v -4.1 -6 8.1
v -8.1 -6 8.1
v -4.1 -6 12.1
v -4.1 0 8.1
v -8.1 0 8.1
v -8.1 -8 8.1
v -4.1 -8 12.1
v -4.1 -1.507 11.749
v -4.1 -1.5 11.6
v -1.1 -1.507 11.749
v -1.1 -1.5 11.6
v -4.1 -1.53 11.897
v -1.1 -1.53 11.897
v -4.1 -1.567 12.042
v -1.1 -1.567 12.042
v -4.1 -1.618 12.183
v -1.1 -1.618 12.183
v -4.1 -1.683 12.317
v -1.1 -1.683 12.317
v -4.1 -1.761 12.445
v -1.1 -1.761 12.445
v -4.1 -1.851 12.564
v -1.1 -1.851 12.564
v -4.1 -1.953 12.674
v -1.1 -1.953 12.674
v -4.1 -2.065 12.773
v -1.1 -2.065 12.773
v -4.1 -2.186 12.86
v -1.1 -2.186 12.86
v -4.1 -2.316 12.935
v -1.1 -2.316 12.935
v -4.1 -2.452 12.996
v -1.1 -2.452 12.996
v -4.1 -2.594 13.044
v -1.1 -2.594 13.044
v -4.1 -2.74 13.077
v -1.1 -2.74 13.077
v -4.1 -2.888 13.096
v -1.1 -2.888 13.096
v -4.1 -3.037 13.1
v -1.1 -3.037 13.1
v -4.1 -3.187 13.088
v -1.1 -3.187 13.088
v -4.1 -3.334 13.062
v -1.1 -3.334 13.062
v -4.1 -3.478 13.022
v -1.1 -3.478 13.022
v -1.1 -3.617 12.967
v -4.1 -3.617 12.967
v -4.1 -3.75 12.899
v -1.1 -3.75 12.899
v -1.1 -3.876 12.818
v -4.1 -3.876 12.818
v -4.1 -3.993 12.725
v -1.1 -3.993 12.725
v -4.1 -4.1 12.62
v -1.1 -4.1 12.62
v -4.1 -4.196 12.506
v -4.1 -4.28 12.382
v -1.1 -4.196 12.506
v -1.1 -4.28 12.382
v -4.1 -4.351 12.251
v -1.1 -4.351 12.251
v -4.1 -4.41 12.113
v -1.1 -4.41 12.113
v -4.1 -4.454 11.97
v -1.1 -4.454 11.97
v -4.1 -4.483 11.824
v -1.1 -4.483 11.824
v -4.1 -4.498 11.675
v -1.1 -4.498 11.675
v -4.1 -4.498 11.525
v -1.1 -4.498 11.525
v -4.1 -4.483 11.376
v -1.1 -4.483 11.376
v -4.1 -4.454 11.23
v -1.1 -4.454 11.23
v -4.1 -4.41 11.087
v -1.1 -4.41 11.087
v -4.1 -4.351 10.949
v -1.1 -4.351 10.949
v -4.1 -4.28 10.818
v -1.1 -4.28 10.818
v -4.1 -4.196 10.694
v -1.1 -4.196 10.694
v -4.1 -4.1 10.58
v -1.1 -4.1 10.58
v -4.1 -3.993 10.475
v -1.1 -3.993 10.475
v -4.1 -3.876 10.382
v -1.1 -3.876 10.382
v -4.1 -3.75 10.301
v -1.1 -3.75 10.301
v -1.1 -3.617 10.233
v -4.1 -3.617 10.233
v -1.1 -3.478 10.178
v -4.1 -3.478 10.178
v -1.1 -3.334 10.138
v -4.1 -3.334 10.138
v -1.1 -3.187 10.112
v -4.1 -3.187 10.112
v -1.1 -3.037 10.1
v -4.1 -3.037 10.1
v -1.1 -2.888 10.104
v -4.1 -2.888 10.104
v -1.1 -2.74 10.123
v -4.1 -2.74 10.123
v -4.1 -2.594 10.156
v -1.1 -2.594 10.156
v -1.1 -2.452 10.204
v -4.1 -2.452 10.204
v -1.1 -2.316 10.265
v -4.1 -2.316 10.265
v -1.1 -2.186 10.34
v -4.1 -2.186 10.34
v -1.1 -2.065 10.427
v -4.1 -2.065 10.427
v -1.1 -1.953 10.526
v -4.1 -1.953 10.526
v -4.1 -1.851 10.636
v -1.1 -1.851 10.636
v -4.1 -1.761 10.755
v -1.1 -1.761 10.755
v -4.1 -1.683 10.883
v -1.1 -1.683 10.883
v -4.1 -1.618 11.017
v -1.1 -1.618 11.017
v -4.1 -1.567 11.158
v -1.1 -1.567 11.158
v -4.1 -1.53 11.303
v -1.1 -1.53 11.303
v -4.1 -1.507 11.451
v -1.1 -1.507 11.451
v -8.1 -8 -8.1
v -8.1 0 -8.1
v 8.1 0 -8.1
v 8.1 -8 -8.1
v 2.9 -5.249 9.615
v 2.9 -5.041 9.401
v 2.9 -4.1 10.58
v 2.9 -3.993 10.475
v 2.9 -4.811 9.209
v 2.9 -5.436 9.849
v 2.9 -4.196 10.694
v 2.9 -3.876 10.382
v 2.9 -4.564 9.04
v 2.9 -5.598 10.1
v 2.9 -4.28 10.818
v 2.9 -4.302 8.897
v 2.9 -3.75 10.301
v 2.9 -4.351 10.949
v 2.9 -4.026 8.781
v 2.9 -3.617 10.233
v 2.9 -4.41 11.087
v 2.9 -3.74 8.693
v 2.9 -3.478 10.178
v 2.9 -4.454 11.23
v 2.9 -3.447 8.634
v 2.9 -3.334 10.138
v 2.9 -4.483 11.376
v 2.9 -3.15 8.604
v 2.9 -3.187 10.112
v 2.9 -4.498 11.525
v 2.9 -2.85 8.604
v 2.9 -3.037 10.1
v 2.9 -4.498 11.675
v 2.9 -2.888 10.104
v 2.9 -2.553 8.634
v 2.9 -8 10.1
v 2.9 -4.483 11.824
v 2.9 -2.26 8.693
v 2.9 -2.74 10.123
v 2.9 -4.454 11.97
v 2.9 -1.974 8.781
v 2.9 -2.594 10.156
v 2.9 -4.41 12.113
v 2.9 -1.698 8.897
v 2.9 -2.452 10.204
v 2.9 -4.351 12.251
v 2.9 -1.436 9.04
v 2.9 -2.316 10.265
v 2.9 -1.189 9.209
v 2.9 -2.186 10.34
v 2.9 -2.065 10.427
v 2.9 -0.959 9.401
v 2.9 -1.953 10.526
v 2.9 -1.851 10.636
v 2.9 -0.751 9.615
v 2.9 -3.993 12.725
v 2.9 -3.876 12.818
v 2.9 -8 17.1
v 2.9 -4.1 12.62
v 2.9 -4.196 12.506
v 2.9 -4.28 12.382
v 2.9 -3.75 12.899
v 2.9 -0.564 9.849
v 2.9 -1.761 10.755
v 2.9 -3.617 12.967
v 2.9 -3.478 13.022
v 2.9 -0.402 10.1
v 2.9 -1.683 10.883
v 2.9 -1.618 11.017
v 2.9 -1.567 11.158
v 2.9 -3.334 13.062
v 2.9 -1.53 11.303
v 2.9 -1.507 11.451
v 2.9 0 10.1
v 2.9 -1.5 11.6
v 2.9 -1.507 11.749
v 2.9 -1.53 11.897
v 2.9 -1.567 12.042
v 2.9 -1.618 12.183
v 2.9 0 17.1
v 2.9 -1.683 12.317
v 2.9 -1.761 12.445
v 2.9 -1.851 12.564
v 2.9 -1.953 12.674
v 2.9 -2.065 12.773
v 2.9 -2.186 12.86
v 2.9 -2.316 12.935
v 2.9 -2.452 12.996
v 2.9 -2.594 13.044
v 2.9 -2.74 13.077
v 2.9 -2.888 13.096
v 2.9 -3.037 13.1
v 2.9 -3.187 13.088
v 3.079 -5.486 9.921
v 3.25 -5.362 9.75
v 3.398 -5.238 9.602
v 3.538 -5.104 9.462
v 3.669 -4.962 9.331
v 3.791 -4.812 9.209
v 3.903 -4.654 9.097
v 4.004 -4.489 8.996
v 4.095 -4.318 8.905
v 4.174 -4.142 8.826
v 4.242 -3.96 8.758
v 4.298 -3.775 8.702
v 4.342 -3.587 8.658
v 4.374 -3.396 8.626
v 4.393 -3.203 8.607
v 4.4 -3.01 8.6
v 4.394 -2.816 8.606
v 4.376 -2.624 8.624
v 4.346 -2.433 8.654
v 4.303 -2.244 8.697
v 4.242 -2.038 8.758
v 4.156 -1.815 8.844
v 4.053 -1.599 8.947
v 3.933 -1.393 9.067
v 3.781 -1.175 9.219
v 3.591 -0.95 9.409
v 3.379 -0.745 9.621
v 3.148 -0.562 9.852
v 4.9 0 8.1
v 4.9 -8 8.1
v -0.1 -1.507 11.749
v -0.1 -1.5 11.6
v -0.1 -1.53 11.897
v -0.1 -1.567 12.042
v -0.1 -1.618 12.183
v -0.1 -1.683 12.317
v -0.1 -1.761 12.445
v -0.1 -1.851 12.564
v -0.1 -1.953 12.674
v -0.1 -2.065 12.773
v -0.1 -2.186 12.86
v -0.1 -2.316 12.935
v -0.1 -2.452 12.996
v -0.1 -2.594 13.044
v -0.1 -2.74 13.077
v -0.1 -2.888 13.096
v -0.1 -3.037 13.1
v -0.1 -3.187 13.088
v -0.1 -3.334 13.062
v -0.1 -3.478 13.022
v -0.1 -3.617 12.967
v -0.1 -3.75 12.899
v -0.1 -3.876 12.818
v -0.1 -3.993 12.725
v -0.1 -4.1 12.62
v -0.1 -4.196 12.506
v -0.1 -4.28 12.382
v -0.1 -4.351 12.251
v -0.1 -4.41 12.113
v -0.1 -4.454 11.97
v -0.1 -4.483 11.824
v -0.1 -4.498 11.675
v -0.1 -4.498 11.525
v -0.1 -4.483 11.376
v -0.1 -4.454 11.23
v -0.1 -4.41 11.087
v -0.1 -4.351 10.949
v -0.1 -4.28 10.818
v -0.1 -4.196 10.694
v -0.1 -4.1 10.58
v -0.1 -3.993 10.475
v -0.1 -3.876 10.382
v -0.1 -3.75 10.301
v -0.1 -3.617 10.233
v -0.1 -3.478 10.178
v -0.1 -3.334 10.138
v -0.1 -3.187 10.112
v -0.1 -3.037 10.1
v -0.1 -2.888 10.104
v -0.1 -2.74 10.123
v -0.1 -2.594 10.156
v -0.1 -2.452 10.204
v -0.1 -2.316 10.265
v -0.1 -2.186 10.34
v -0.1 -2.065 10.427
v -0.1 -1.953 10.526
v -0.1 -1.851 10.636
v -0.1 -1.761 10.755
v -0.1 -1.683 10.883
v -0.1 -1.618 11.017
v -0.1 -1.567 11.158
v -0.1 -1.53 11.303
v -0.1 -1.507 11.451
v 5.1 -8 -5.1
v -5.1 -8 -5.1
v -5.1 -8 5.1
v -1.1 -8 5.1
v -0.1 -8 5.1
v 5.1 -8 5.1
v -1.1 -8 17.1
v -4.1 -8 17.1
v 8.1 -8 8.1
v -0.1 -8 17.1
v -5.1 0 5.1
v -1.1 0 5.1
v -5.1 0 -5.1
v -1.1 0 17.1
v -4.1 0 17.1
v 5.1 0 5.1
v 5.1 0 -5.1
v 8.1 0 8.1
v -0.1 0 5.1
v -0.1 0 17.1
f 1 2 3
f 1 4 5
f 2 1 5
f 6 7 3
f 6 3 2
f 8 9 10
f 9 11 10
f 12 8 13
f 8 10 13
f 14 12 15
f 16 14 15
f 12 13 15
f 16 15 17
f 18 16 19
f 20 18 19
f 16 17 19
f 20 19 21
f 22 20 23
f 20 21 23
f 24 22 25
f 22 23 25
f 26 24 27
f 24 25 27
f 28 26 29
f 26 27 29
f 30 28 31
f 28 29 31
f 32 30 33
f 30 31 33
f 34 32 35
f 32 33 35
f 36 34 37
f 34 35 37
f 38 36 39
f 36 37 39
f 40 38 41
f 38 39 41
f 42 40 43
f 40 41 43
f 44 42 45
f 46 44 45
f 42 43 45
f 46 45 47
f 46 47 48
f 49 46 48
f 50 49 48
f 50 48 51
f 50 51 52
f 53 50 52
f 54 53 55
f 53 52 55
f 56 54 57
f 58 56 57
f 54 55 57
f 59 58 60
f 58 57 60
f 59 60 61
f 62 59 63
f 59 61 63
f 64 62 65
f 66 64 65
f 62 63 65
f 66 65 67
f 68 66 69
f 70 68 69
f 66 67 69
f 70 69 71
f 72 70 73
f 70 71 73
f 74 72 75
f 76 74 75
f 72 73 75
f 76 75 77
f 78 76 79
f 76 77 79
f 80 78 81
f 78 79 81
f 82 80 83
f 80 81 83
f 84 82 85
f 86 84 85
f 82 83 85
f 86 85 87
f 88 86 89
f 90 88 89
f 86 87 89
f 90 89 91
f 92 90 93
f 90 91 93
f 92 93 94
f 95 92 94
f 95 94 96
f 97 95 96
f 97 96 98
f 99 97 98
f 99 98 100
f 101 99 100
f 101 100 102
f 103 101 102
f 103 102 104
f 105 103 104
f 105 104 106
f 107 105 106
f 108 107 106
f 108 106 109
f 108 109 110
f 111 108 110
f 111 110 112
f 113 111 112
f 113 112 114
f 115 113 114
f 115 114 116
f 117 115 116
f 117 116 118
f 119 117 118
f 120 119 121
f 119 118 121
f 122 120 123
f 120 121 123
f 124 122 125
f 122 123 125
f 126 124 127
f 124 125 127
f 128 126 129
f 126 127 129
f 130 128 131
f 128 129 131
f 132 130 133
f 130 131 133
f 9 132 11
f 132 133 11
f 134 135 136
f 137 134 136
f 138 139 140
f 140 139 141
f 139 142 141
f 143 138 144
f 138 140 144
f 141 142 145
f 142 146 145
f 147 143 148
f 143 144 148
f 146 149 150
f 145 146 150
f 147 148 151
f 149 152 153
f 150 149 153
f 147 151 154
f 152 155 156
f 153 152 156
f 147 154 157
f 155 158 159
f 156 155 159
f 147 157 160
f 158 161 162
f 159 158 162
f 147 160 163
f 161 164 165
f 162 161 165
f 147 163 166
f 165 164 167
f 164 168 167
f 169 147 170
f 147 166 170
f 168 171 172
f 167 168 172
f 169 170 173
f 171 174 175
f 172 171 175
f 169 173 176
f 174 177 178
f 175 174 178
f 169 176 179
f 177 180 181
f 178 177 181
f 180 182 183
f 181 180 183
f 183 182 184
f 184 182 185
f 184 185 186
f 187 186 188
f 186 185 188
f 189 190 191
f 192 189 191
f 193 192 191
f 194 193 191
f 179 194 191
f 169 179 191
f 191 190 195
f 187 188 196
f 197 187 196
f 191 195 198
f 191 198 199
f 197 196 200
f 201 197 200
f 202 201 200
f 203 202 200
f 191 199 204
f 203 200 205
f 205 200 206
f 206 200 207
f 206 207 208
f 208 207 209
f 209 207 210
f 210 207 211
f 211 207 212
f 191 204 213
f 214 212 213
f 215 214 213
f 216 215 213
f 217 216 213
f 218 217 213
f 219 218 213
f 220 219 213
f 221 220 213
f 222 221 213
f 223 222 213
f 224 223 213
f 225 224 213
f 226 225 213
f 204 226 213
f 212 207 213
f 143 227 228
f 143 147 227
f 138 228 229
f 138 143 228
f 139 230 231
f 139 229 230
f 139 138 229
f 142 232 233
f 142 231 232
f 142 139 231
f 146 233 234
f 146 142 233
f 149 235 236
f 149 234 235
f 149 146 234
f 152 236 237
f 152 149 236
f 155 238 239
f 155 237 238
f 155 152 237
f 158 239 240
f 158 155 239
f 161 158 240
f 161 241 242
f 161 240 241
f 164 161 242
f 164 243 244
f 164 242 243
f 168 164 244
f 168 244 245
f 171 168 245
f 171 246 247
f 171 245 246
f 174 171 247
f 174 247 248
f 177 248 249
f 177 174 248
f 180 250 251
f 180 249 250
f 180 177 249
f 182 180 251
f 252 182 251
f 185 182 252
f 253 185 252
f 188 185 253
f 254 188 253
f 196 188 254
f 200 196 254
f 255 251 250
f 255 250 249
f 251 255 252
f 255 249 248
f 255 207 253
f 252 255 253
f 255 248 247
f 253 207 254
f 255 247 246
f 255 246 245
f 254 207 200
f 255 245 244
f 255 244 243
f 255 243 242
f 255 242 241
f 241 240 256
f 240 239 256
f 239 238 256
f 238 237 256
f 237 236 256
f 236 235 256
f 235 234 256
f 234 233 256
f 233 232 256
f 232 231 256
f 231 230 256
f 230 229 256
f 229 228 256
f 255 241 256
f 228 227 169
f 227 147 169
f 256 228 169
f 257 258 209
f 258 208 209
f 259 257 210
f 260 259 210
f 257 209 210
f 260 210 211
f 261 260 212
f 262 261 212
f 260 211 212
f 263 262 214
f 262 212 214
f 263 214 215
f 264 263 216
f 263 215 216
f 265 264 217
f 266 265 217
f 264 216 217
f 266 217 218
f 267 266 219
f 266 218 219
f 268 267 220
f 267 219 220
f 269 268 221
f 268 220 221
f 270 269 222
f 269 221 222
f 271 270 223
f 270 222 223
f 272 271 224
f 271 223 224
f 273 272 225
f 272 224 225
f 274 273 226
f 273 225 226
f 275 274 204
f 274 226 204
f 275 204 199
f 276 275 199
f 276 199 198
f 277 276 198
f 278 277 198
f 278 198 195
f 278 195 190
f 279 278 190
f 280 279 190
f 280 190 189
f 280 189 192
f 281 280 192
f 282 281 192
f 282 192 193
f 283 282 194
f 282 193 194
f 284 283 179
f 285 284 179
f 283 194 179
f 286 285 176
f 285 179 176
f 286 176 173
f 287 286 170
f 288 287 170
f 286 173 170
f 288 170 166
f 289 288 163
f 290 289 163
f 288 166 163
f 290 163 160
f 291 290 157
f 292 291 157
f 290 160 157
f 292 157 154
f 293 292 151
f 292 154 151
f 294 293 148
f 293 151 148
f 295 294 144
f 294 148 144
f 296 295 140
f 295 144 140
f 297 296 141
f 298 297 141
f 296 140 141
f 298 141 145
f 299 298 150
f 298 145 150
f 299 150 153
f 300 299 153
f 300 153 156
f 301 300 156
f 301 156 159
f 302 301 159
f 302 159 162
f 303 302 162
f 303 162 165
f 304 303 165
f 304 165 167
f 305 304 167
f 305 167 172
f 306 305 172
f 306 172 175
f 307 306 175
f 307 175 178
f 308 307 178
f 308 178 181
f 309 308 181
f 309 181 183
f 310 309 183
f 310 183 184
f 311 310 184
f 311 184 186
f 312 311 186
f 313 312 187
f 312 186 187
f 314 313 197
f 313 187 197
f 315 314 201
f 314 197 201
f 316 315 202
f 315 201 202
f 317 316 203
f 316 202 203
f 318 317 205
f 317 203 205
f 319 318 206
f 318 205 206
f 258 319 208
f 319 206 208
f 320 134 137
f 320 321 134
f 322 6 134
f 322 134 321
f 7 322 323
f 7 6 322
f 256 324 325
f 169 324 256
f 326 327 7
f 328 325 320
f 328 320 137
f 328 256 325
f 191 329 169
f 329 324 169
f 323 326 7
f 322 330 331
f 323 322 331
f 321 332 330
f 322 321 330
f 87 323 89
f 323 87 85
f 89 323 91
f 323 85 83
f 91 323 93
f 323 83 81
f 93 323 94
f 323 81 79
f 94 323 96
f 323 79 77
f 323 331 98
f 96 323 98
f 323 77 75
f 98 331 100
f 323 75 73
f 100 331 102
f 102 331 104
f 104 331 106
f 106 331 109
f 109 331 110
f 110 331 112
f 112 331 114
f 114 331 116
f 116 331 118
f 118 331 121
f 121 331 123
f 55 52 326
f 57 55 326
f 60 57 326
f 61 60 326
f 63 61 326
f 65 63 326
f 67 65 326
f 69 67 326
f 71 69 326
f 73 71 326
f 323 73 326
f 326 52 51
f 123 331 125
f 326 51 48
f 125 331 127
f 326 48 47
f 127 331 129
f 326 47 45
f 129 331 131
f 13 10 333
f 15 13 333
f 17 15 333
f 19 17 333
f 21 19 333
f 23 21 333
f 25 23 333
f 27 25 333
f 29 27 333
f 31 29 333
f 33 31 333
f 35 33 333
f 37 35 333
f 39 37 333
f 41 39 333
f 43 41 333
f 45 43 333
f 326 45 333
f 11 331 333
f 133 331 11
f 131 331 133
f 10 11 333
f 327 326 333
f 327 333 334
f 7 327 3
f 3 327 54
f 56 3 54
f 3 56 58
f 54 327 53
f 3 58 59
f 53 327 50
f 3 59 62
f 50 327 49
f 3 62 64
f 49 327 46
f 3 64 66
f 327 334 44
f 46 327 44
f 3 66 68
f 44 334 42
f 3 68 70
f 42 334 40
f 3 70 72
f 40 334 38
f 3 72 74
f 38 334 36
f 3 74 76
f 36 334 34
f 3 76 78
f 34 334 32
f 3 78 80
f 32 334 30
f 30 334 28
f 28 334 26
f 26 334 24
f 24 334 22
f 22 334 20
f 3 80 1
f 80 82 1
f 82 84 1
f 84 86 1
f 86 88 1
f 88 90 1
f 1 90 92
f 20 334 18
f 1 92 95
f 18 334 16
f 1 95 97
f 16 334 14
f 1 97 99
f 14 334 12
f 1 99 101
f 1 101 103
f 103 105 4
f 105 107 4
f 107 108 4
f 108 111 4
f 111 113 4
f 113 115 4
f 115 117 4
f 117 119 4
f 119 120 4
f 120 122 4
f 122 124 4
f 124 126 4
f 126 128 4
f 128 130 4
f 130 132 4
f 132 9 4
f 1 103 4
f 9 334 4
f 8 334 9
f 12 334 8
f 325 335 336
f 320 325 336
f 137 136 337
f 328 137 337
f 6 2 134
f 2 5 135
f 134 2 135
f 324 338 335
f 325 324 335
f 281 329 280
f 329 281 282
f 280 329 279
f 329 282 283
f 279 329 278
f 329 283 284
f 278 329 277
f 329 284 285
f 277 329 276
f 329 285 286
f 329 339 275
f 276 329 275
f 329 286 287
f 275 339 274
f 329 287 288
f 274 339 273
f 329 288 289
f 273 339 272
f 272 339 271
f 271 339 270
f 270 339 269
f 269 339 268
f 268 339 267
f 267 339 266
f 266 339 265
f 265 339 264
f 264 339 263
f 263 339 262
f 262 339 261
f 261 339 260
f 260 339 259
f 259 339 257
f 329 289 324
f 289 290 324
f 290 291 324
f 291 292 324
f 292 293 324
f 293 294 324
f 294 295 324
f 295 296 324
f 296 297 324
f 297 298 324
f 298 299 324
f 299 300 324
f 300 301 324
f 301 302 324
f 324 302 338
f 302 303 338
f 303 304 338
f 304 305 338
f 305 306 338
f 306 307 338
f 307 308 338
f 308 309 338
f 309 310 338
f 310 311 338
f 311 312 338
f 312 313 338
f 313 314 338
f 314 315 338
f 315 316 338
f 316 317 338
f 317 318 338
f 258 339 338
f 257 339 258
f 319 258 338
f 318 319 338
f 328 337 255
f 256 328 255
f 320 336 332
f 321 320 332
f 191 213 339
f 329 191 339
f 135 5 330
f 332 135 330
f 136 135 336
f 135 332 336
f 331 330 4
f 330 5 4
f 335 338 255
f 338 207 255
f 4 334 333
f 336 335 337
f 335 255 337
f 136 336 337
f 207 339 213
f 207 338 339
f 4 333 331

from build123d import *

# Parameters (mm, degrees)
F1_DEPTH = 8
F2_R     = 1.5
F3_DEPTH = 12.5
F4_SIZE  = 1.99999
F5_R     = 3
F6_DEPTH = 4
F8_DEPTH = 2


# Not quite as in the source:
# - a fillet or chamfer is up to 0.001 mm smaller than in the source, because OpenCascade refuses the exact size


with BuildPart() as f1:
    # F0 (on Front) → F1 (new body)
    with BuildSketch(Plane.XZ):
        Polygon((5.1, 5.1), (5.1, -5.1), (-5.1, -5.1), (-5.1, 5.1), (-4.1, 5.1), (-1.1, 5.1), (-1.1, 8.1), (-1.1, 17.1), (-4.1, 17.1), (-4.1, 8.1), (-5.1, 8.1), (-8.1, 8.1), (-8.1, -8.1), (8.1, -8.1), (8.1, 8.1), (2.9, 8.1), (2.9, 17.1), (-0.1, 17.1), (-0.1, 8.1), (-0.1, 5.1), align=None)
    extrude(amount=F1_DEPTH)

    # F2 (on face) → F3 (cut, symmetric)
    with BuildSketch(Plane.YZ.offset(-1.1)):
        with Locations((-3, 11.6)):
            Circle(F2_R)
    extrude(amount=F3_DEPTH, both=True, mode=Mode.SUBTRACT)

    # F4 (size 2 in the source; OpenCascade refuses exactly that, so slightly less here)
    f4_edges = [f1.edges().sort_by_distance(p)[0] for p in [
        (2.9, -4, 8.1),
    ]]
    chamfer(f4_edges, length=F4_SIZE)

    # F5 (on face) → F6 (cut)
    with BuildSketch(Plane.YZ.offset(2.9)):
        with Locations((-3, 11.6)):
            Circle(F5_R)
    extrude(amount=F6_DEPTH, mode=Mode.SUBTRACT)

    # F7 (on face) → F8 (join)
    with BuildSketch(Plane.XZ.offset(8)):
        Polygon((-4.1, 12.1), (-8.1, 8.1), (-4.1, 8.1), align=None)
    extrude(amount=-F8_DEPTH)


solid = f1.part
